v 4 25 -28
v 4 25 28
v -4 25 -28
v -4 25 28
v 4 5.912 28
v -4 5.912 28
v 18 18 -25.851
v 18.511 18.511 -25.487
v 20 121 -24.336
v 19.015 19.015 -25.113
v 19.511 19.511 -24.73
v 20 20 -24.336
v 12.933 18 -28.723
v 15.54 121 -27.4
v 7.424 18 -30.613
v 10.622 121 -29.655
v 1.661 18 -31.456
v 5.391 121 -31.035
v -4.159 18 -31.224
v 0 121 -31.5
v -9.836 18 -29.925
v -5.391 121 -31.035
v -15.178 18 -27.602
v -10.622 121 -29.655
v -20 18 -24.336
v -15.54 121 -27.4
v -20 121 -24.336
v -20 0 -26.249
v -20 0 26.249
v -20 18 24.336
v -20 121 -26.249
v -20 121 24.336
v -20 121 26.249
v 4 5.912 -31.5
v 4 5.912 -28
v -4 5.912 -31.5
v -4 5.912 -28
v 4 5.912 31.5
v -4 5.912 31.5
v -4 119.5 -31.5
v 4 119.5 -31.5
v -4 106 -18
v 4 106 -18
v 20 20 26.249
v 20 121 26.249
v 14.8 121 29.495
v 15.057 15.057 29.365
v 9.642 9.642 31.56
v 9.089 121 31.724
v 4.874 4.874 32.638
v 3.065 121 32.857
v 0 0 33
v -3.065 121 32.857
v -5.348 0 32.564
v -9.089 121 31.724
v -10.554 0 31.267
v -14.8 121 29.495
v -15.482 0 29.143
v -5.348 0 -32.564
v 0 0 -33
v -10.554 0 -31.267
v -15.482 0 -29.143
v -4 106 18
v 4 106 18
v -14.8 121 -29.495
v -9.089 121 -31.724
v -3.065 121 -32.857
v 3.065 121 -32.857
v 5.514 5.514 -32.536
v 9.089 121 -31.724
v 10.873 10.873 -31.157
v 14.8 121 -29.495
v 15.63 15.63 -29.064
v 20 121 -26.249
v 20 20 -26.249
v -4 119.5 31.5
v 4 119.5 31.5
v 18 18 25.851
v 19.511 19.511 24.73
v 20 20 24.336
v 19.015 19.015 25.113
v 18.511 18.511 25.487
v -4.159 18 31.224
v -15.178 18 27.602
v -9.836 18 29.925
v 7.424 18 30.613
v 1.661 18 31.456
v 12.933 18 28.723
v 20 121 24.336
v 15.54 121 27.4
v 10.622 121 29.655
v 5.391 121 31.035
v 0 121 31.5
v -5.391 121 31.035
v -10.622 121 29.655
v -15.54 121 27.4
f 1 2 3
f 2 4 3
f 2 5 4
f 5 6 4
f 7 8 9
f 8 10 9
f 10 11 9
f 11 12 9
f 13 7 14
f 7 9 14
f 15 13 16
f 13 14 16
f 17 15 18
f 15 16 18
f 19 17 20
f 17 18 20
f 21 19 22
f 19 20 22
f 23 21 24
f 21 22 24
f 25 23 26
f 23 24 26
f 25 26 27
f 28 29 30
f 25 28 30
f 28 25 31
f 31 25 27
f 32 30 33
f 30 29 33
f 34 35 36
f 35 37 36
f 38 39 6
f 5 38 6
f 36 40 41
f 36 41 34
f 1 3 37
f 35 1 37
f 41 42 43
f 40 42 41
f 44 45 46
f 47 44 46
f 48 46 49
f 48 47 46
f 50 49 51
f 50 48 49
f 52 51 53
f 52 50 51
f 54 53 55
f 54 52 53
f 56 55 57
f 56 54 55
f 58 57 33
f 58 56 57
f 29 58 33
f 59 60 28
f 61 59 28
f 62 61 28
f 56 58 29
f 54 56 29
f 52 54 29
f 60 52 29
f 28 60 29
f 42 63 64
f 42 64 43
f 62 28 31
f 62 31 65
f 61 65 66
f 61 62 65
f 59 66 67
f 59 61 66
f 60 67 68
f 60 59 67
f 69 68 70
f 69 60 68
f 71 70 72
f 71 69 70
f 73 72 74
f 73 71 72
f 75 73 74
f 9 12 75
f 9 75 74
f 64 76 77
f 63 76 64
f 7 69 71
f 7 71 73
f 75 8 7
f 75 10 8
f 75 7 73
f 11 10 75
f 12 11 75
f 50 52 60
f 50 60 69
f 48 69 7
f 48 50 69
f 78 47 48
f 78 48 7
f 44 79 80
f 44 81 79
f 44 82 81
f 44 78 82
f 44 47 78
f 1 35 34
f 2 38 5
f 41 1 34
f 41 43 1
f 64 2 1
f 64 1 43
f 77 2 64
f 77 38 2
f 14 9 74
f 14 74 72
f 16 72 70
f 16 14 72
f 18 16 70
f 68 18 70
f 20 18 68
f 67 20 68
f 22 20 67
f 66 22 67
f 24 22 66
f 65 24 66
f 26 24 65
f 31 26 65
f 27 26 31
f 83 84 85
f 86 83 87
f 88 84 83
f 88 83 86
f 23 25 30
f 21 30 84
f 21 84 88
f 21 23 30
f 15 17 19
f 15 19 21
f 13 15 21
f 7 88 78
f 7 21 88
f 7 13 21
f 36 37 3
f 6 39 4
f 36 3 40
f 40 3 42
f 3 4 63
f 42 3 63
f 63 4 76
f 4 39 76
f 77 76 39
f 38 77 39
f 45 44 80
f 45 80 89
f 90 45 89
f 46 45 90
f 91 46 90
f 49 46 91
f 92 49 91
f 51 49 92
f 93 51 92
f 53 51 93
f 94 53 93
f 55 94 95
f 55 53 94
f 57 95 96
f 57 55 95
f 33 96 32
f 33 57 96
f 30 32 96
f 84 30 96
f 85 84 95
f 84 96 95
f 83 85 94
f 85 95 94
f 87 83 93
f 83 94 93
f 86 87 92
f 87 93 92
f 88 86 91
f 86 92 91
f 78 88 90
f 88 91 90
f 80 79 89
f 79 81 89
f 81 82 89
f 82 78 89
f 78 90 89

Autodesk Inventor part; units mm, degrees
ref_plane "XZ Plane" through (0, 0, 0) normal (0, 1, 0) x (-1, 0, 0)
sketch "Sketch1" plane through (0, 0, 0) normal (0, 1, 0) x (-1, 0, 0)
  circle A0 centre (0, 0) radius 33
  dimension "d0" = 66
extrude "Extrusion1" add sketch "Sketch1" along normal blind 121
sketch "Sketch2" plane through (0, 121, 0) normal (0, 1, 0) x (1, 0, 0)
  circle A0 centre (0, 0) radius 31.5
  dimension "d3" = 63
extrude "Extrusion2" cut sketch "Sketch2" against normal blind 103
sketch "Sketch3" plane through (0, 0, 0) normal (1, 0, 0) x (0, 1, 0)
  line L0 (121, 31.5) -> (121, -31.5) projected
  line L1 (0, -33) -> (0, 33) projected
  line L2 (5.9121, 31.5) -> (5.9121, 28)
  line L3 (5.9121, 28) -> (25, 28)
  line L4 (25, 28) -> (25, -28)
  line L5 (25, -28) -> (5.9121, -28)
  line L6 (5.9121, -28) -> (5.9121, -31.5)
  line L7 (121, -33) -> (121, 33) projected
  line L8 (119.5, 31.5) -> (106, 18)
  line L9 (106, 18) -> (106, -18)
  line L10 (106, -18) -> (119.5, -31.5)
  line L11 (121, 31.5) -> (18, 31.5) projected
  line L12 (121, -31.5) -> (18, -31.5) projected
  line L13 (121, 31.5) -> (18, 31.5) projected
  line L14 (119.5, 31.5) -> (5.9121, 31.5)
  line L15 (5.9121, -31.5) -> (119.5, -31.5)
  line L16 (121, -31.5) -> (18, -31.5) projected
  point P0 (5.9121, -33)
  point P1 (25, 0)
  point P2 (121, 0)
  dimension "d13" = 25
  dimension "d17" = 15
  dimension "d19" = 15
  dimension "d33" = 3.5
extrude "Extrusion4" add sketch "Sketch3" along normal mid plane 8 separate body contours L8 L9 L10 L12 L15 L6 L5 L4 L3 L2 L14 L11
ref_plane "Work Plane1" through (20, 0, 0) normal (1, 0, 0) x (0, 1, 0)
ref_plane "Work Plane2" through (-20, 0, 0) normal (1, 0, 0) x (0, 1, 0)
sketch "Sketch4" plane through (20, 0, 0) normal (1, 0, 0) x (0, 1, 0)
  line L0 (-18.9358, -46.7949) -> (142.2545, -46.7949)
  line L1 (142.2545, -46.7949) -> (142.2545, 56.6765)
  line L2 (142.2545, 56.6765) -> (-18.9358, 56.6765)
  line L3 (-18.9358, 56.6765) -> (-18.9358, -46.7949)
  point P0 (0, 0)
extrude "Extrusion5" cut sketch "Sketch4" along normal blind 100 bodies 1
sketch "Sketch5" plane through (-20, 0, 0) normal (1, 0, 0) x (0, 1, 0)
  line L0 (136.7321, -48.8329) -> (-13.7148, -48.8329)
  line L1 (-13.7148, -48.8329) -> (-13.7148, 47.5861)
  line L2 (-13.7148, 47.5861) -> (136.7321, 47.5861)
  line L3 (136.7321, 47.5861) -> (136.7321, -48.8329)
  point P0 (0, 0)
extrude "Extrusion6" cut sketch "Sketch5" against normal blind 100 bodies 1
chamfer "Chamfer5" distance 20 angle 45 1 edges at (20, 0, 0)
properties part number "cansat_estructura3"
